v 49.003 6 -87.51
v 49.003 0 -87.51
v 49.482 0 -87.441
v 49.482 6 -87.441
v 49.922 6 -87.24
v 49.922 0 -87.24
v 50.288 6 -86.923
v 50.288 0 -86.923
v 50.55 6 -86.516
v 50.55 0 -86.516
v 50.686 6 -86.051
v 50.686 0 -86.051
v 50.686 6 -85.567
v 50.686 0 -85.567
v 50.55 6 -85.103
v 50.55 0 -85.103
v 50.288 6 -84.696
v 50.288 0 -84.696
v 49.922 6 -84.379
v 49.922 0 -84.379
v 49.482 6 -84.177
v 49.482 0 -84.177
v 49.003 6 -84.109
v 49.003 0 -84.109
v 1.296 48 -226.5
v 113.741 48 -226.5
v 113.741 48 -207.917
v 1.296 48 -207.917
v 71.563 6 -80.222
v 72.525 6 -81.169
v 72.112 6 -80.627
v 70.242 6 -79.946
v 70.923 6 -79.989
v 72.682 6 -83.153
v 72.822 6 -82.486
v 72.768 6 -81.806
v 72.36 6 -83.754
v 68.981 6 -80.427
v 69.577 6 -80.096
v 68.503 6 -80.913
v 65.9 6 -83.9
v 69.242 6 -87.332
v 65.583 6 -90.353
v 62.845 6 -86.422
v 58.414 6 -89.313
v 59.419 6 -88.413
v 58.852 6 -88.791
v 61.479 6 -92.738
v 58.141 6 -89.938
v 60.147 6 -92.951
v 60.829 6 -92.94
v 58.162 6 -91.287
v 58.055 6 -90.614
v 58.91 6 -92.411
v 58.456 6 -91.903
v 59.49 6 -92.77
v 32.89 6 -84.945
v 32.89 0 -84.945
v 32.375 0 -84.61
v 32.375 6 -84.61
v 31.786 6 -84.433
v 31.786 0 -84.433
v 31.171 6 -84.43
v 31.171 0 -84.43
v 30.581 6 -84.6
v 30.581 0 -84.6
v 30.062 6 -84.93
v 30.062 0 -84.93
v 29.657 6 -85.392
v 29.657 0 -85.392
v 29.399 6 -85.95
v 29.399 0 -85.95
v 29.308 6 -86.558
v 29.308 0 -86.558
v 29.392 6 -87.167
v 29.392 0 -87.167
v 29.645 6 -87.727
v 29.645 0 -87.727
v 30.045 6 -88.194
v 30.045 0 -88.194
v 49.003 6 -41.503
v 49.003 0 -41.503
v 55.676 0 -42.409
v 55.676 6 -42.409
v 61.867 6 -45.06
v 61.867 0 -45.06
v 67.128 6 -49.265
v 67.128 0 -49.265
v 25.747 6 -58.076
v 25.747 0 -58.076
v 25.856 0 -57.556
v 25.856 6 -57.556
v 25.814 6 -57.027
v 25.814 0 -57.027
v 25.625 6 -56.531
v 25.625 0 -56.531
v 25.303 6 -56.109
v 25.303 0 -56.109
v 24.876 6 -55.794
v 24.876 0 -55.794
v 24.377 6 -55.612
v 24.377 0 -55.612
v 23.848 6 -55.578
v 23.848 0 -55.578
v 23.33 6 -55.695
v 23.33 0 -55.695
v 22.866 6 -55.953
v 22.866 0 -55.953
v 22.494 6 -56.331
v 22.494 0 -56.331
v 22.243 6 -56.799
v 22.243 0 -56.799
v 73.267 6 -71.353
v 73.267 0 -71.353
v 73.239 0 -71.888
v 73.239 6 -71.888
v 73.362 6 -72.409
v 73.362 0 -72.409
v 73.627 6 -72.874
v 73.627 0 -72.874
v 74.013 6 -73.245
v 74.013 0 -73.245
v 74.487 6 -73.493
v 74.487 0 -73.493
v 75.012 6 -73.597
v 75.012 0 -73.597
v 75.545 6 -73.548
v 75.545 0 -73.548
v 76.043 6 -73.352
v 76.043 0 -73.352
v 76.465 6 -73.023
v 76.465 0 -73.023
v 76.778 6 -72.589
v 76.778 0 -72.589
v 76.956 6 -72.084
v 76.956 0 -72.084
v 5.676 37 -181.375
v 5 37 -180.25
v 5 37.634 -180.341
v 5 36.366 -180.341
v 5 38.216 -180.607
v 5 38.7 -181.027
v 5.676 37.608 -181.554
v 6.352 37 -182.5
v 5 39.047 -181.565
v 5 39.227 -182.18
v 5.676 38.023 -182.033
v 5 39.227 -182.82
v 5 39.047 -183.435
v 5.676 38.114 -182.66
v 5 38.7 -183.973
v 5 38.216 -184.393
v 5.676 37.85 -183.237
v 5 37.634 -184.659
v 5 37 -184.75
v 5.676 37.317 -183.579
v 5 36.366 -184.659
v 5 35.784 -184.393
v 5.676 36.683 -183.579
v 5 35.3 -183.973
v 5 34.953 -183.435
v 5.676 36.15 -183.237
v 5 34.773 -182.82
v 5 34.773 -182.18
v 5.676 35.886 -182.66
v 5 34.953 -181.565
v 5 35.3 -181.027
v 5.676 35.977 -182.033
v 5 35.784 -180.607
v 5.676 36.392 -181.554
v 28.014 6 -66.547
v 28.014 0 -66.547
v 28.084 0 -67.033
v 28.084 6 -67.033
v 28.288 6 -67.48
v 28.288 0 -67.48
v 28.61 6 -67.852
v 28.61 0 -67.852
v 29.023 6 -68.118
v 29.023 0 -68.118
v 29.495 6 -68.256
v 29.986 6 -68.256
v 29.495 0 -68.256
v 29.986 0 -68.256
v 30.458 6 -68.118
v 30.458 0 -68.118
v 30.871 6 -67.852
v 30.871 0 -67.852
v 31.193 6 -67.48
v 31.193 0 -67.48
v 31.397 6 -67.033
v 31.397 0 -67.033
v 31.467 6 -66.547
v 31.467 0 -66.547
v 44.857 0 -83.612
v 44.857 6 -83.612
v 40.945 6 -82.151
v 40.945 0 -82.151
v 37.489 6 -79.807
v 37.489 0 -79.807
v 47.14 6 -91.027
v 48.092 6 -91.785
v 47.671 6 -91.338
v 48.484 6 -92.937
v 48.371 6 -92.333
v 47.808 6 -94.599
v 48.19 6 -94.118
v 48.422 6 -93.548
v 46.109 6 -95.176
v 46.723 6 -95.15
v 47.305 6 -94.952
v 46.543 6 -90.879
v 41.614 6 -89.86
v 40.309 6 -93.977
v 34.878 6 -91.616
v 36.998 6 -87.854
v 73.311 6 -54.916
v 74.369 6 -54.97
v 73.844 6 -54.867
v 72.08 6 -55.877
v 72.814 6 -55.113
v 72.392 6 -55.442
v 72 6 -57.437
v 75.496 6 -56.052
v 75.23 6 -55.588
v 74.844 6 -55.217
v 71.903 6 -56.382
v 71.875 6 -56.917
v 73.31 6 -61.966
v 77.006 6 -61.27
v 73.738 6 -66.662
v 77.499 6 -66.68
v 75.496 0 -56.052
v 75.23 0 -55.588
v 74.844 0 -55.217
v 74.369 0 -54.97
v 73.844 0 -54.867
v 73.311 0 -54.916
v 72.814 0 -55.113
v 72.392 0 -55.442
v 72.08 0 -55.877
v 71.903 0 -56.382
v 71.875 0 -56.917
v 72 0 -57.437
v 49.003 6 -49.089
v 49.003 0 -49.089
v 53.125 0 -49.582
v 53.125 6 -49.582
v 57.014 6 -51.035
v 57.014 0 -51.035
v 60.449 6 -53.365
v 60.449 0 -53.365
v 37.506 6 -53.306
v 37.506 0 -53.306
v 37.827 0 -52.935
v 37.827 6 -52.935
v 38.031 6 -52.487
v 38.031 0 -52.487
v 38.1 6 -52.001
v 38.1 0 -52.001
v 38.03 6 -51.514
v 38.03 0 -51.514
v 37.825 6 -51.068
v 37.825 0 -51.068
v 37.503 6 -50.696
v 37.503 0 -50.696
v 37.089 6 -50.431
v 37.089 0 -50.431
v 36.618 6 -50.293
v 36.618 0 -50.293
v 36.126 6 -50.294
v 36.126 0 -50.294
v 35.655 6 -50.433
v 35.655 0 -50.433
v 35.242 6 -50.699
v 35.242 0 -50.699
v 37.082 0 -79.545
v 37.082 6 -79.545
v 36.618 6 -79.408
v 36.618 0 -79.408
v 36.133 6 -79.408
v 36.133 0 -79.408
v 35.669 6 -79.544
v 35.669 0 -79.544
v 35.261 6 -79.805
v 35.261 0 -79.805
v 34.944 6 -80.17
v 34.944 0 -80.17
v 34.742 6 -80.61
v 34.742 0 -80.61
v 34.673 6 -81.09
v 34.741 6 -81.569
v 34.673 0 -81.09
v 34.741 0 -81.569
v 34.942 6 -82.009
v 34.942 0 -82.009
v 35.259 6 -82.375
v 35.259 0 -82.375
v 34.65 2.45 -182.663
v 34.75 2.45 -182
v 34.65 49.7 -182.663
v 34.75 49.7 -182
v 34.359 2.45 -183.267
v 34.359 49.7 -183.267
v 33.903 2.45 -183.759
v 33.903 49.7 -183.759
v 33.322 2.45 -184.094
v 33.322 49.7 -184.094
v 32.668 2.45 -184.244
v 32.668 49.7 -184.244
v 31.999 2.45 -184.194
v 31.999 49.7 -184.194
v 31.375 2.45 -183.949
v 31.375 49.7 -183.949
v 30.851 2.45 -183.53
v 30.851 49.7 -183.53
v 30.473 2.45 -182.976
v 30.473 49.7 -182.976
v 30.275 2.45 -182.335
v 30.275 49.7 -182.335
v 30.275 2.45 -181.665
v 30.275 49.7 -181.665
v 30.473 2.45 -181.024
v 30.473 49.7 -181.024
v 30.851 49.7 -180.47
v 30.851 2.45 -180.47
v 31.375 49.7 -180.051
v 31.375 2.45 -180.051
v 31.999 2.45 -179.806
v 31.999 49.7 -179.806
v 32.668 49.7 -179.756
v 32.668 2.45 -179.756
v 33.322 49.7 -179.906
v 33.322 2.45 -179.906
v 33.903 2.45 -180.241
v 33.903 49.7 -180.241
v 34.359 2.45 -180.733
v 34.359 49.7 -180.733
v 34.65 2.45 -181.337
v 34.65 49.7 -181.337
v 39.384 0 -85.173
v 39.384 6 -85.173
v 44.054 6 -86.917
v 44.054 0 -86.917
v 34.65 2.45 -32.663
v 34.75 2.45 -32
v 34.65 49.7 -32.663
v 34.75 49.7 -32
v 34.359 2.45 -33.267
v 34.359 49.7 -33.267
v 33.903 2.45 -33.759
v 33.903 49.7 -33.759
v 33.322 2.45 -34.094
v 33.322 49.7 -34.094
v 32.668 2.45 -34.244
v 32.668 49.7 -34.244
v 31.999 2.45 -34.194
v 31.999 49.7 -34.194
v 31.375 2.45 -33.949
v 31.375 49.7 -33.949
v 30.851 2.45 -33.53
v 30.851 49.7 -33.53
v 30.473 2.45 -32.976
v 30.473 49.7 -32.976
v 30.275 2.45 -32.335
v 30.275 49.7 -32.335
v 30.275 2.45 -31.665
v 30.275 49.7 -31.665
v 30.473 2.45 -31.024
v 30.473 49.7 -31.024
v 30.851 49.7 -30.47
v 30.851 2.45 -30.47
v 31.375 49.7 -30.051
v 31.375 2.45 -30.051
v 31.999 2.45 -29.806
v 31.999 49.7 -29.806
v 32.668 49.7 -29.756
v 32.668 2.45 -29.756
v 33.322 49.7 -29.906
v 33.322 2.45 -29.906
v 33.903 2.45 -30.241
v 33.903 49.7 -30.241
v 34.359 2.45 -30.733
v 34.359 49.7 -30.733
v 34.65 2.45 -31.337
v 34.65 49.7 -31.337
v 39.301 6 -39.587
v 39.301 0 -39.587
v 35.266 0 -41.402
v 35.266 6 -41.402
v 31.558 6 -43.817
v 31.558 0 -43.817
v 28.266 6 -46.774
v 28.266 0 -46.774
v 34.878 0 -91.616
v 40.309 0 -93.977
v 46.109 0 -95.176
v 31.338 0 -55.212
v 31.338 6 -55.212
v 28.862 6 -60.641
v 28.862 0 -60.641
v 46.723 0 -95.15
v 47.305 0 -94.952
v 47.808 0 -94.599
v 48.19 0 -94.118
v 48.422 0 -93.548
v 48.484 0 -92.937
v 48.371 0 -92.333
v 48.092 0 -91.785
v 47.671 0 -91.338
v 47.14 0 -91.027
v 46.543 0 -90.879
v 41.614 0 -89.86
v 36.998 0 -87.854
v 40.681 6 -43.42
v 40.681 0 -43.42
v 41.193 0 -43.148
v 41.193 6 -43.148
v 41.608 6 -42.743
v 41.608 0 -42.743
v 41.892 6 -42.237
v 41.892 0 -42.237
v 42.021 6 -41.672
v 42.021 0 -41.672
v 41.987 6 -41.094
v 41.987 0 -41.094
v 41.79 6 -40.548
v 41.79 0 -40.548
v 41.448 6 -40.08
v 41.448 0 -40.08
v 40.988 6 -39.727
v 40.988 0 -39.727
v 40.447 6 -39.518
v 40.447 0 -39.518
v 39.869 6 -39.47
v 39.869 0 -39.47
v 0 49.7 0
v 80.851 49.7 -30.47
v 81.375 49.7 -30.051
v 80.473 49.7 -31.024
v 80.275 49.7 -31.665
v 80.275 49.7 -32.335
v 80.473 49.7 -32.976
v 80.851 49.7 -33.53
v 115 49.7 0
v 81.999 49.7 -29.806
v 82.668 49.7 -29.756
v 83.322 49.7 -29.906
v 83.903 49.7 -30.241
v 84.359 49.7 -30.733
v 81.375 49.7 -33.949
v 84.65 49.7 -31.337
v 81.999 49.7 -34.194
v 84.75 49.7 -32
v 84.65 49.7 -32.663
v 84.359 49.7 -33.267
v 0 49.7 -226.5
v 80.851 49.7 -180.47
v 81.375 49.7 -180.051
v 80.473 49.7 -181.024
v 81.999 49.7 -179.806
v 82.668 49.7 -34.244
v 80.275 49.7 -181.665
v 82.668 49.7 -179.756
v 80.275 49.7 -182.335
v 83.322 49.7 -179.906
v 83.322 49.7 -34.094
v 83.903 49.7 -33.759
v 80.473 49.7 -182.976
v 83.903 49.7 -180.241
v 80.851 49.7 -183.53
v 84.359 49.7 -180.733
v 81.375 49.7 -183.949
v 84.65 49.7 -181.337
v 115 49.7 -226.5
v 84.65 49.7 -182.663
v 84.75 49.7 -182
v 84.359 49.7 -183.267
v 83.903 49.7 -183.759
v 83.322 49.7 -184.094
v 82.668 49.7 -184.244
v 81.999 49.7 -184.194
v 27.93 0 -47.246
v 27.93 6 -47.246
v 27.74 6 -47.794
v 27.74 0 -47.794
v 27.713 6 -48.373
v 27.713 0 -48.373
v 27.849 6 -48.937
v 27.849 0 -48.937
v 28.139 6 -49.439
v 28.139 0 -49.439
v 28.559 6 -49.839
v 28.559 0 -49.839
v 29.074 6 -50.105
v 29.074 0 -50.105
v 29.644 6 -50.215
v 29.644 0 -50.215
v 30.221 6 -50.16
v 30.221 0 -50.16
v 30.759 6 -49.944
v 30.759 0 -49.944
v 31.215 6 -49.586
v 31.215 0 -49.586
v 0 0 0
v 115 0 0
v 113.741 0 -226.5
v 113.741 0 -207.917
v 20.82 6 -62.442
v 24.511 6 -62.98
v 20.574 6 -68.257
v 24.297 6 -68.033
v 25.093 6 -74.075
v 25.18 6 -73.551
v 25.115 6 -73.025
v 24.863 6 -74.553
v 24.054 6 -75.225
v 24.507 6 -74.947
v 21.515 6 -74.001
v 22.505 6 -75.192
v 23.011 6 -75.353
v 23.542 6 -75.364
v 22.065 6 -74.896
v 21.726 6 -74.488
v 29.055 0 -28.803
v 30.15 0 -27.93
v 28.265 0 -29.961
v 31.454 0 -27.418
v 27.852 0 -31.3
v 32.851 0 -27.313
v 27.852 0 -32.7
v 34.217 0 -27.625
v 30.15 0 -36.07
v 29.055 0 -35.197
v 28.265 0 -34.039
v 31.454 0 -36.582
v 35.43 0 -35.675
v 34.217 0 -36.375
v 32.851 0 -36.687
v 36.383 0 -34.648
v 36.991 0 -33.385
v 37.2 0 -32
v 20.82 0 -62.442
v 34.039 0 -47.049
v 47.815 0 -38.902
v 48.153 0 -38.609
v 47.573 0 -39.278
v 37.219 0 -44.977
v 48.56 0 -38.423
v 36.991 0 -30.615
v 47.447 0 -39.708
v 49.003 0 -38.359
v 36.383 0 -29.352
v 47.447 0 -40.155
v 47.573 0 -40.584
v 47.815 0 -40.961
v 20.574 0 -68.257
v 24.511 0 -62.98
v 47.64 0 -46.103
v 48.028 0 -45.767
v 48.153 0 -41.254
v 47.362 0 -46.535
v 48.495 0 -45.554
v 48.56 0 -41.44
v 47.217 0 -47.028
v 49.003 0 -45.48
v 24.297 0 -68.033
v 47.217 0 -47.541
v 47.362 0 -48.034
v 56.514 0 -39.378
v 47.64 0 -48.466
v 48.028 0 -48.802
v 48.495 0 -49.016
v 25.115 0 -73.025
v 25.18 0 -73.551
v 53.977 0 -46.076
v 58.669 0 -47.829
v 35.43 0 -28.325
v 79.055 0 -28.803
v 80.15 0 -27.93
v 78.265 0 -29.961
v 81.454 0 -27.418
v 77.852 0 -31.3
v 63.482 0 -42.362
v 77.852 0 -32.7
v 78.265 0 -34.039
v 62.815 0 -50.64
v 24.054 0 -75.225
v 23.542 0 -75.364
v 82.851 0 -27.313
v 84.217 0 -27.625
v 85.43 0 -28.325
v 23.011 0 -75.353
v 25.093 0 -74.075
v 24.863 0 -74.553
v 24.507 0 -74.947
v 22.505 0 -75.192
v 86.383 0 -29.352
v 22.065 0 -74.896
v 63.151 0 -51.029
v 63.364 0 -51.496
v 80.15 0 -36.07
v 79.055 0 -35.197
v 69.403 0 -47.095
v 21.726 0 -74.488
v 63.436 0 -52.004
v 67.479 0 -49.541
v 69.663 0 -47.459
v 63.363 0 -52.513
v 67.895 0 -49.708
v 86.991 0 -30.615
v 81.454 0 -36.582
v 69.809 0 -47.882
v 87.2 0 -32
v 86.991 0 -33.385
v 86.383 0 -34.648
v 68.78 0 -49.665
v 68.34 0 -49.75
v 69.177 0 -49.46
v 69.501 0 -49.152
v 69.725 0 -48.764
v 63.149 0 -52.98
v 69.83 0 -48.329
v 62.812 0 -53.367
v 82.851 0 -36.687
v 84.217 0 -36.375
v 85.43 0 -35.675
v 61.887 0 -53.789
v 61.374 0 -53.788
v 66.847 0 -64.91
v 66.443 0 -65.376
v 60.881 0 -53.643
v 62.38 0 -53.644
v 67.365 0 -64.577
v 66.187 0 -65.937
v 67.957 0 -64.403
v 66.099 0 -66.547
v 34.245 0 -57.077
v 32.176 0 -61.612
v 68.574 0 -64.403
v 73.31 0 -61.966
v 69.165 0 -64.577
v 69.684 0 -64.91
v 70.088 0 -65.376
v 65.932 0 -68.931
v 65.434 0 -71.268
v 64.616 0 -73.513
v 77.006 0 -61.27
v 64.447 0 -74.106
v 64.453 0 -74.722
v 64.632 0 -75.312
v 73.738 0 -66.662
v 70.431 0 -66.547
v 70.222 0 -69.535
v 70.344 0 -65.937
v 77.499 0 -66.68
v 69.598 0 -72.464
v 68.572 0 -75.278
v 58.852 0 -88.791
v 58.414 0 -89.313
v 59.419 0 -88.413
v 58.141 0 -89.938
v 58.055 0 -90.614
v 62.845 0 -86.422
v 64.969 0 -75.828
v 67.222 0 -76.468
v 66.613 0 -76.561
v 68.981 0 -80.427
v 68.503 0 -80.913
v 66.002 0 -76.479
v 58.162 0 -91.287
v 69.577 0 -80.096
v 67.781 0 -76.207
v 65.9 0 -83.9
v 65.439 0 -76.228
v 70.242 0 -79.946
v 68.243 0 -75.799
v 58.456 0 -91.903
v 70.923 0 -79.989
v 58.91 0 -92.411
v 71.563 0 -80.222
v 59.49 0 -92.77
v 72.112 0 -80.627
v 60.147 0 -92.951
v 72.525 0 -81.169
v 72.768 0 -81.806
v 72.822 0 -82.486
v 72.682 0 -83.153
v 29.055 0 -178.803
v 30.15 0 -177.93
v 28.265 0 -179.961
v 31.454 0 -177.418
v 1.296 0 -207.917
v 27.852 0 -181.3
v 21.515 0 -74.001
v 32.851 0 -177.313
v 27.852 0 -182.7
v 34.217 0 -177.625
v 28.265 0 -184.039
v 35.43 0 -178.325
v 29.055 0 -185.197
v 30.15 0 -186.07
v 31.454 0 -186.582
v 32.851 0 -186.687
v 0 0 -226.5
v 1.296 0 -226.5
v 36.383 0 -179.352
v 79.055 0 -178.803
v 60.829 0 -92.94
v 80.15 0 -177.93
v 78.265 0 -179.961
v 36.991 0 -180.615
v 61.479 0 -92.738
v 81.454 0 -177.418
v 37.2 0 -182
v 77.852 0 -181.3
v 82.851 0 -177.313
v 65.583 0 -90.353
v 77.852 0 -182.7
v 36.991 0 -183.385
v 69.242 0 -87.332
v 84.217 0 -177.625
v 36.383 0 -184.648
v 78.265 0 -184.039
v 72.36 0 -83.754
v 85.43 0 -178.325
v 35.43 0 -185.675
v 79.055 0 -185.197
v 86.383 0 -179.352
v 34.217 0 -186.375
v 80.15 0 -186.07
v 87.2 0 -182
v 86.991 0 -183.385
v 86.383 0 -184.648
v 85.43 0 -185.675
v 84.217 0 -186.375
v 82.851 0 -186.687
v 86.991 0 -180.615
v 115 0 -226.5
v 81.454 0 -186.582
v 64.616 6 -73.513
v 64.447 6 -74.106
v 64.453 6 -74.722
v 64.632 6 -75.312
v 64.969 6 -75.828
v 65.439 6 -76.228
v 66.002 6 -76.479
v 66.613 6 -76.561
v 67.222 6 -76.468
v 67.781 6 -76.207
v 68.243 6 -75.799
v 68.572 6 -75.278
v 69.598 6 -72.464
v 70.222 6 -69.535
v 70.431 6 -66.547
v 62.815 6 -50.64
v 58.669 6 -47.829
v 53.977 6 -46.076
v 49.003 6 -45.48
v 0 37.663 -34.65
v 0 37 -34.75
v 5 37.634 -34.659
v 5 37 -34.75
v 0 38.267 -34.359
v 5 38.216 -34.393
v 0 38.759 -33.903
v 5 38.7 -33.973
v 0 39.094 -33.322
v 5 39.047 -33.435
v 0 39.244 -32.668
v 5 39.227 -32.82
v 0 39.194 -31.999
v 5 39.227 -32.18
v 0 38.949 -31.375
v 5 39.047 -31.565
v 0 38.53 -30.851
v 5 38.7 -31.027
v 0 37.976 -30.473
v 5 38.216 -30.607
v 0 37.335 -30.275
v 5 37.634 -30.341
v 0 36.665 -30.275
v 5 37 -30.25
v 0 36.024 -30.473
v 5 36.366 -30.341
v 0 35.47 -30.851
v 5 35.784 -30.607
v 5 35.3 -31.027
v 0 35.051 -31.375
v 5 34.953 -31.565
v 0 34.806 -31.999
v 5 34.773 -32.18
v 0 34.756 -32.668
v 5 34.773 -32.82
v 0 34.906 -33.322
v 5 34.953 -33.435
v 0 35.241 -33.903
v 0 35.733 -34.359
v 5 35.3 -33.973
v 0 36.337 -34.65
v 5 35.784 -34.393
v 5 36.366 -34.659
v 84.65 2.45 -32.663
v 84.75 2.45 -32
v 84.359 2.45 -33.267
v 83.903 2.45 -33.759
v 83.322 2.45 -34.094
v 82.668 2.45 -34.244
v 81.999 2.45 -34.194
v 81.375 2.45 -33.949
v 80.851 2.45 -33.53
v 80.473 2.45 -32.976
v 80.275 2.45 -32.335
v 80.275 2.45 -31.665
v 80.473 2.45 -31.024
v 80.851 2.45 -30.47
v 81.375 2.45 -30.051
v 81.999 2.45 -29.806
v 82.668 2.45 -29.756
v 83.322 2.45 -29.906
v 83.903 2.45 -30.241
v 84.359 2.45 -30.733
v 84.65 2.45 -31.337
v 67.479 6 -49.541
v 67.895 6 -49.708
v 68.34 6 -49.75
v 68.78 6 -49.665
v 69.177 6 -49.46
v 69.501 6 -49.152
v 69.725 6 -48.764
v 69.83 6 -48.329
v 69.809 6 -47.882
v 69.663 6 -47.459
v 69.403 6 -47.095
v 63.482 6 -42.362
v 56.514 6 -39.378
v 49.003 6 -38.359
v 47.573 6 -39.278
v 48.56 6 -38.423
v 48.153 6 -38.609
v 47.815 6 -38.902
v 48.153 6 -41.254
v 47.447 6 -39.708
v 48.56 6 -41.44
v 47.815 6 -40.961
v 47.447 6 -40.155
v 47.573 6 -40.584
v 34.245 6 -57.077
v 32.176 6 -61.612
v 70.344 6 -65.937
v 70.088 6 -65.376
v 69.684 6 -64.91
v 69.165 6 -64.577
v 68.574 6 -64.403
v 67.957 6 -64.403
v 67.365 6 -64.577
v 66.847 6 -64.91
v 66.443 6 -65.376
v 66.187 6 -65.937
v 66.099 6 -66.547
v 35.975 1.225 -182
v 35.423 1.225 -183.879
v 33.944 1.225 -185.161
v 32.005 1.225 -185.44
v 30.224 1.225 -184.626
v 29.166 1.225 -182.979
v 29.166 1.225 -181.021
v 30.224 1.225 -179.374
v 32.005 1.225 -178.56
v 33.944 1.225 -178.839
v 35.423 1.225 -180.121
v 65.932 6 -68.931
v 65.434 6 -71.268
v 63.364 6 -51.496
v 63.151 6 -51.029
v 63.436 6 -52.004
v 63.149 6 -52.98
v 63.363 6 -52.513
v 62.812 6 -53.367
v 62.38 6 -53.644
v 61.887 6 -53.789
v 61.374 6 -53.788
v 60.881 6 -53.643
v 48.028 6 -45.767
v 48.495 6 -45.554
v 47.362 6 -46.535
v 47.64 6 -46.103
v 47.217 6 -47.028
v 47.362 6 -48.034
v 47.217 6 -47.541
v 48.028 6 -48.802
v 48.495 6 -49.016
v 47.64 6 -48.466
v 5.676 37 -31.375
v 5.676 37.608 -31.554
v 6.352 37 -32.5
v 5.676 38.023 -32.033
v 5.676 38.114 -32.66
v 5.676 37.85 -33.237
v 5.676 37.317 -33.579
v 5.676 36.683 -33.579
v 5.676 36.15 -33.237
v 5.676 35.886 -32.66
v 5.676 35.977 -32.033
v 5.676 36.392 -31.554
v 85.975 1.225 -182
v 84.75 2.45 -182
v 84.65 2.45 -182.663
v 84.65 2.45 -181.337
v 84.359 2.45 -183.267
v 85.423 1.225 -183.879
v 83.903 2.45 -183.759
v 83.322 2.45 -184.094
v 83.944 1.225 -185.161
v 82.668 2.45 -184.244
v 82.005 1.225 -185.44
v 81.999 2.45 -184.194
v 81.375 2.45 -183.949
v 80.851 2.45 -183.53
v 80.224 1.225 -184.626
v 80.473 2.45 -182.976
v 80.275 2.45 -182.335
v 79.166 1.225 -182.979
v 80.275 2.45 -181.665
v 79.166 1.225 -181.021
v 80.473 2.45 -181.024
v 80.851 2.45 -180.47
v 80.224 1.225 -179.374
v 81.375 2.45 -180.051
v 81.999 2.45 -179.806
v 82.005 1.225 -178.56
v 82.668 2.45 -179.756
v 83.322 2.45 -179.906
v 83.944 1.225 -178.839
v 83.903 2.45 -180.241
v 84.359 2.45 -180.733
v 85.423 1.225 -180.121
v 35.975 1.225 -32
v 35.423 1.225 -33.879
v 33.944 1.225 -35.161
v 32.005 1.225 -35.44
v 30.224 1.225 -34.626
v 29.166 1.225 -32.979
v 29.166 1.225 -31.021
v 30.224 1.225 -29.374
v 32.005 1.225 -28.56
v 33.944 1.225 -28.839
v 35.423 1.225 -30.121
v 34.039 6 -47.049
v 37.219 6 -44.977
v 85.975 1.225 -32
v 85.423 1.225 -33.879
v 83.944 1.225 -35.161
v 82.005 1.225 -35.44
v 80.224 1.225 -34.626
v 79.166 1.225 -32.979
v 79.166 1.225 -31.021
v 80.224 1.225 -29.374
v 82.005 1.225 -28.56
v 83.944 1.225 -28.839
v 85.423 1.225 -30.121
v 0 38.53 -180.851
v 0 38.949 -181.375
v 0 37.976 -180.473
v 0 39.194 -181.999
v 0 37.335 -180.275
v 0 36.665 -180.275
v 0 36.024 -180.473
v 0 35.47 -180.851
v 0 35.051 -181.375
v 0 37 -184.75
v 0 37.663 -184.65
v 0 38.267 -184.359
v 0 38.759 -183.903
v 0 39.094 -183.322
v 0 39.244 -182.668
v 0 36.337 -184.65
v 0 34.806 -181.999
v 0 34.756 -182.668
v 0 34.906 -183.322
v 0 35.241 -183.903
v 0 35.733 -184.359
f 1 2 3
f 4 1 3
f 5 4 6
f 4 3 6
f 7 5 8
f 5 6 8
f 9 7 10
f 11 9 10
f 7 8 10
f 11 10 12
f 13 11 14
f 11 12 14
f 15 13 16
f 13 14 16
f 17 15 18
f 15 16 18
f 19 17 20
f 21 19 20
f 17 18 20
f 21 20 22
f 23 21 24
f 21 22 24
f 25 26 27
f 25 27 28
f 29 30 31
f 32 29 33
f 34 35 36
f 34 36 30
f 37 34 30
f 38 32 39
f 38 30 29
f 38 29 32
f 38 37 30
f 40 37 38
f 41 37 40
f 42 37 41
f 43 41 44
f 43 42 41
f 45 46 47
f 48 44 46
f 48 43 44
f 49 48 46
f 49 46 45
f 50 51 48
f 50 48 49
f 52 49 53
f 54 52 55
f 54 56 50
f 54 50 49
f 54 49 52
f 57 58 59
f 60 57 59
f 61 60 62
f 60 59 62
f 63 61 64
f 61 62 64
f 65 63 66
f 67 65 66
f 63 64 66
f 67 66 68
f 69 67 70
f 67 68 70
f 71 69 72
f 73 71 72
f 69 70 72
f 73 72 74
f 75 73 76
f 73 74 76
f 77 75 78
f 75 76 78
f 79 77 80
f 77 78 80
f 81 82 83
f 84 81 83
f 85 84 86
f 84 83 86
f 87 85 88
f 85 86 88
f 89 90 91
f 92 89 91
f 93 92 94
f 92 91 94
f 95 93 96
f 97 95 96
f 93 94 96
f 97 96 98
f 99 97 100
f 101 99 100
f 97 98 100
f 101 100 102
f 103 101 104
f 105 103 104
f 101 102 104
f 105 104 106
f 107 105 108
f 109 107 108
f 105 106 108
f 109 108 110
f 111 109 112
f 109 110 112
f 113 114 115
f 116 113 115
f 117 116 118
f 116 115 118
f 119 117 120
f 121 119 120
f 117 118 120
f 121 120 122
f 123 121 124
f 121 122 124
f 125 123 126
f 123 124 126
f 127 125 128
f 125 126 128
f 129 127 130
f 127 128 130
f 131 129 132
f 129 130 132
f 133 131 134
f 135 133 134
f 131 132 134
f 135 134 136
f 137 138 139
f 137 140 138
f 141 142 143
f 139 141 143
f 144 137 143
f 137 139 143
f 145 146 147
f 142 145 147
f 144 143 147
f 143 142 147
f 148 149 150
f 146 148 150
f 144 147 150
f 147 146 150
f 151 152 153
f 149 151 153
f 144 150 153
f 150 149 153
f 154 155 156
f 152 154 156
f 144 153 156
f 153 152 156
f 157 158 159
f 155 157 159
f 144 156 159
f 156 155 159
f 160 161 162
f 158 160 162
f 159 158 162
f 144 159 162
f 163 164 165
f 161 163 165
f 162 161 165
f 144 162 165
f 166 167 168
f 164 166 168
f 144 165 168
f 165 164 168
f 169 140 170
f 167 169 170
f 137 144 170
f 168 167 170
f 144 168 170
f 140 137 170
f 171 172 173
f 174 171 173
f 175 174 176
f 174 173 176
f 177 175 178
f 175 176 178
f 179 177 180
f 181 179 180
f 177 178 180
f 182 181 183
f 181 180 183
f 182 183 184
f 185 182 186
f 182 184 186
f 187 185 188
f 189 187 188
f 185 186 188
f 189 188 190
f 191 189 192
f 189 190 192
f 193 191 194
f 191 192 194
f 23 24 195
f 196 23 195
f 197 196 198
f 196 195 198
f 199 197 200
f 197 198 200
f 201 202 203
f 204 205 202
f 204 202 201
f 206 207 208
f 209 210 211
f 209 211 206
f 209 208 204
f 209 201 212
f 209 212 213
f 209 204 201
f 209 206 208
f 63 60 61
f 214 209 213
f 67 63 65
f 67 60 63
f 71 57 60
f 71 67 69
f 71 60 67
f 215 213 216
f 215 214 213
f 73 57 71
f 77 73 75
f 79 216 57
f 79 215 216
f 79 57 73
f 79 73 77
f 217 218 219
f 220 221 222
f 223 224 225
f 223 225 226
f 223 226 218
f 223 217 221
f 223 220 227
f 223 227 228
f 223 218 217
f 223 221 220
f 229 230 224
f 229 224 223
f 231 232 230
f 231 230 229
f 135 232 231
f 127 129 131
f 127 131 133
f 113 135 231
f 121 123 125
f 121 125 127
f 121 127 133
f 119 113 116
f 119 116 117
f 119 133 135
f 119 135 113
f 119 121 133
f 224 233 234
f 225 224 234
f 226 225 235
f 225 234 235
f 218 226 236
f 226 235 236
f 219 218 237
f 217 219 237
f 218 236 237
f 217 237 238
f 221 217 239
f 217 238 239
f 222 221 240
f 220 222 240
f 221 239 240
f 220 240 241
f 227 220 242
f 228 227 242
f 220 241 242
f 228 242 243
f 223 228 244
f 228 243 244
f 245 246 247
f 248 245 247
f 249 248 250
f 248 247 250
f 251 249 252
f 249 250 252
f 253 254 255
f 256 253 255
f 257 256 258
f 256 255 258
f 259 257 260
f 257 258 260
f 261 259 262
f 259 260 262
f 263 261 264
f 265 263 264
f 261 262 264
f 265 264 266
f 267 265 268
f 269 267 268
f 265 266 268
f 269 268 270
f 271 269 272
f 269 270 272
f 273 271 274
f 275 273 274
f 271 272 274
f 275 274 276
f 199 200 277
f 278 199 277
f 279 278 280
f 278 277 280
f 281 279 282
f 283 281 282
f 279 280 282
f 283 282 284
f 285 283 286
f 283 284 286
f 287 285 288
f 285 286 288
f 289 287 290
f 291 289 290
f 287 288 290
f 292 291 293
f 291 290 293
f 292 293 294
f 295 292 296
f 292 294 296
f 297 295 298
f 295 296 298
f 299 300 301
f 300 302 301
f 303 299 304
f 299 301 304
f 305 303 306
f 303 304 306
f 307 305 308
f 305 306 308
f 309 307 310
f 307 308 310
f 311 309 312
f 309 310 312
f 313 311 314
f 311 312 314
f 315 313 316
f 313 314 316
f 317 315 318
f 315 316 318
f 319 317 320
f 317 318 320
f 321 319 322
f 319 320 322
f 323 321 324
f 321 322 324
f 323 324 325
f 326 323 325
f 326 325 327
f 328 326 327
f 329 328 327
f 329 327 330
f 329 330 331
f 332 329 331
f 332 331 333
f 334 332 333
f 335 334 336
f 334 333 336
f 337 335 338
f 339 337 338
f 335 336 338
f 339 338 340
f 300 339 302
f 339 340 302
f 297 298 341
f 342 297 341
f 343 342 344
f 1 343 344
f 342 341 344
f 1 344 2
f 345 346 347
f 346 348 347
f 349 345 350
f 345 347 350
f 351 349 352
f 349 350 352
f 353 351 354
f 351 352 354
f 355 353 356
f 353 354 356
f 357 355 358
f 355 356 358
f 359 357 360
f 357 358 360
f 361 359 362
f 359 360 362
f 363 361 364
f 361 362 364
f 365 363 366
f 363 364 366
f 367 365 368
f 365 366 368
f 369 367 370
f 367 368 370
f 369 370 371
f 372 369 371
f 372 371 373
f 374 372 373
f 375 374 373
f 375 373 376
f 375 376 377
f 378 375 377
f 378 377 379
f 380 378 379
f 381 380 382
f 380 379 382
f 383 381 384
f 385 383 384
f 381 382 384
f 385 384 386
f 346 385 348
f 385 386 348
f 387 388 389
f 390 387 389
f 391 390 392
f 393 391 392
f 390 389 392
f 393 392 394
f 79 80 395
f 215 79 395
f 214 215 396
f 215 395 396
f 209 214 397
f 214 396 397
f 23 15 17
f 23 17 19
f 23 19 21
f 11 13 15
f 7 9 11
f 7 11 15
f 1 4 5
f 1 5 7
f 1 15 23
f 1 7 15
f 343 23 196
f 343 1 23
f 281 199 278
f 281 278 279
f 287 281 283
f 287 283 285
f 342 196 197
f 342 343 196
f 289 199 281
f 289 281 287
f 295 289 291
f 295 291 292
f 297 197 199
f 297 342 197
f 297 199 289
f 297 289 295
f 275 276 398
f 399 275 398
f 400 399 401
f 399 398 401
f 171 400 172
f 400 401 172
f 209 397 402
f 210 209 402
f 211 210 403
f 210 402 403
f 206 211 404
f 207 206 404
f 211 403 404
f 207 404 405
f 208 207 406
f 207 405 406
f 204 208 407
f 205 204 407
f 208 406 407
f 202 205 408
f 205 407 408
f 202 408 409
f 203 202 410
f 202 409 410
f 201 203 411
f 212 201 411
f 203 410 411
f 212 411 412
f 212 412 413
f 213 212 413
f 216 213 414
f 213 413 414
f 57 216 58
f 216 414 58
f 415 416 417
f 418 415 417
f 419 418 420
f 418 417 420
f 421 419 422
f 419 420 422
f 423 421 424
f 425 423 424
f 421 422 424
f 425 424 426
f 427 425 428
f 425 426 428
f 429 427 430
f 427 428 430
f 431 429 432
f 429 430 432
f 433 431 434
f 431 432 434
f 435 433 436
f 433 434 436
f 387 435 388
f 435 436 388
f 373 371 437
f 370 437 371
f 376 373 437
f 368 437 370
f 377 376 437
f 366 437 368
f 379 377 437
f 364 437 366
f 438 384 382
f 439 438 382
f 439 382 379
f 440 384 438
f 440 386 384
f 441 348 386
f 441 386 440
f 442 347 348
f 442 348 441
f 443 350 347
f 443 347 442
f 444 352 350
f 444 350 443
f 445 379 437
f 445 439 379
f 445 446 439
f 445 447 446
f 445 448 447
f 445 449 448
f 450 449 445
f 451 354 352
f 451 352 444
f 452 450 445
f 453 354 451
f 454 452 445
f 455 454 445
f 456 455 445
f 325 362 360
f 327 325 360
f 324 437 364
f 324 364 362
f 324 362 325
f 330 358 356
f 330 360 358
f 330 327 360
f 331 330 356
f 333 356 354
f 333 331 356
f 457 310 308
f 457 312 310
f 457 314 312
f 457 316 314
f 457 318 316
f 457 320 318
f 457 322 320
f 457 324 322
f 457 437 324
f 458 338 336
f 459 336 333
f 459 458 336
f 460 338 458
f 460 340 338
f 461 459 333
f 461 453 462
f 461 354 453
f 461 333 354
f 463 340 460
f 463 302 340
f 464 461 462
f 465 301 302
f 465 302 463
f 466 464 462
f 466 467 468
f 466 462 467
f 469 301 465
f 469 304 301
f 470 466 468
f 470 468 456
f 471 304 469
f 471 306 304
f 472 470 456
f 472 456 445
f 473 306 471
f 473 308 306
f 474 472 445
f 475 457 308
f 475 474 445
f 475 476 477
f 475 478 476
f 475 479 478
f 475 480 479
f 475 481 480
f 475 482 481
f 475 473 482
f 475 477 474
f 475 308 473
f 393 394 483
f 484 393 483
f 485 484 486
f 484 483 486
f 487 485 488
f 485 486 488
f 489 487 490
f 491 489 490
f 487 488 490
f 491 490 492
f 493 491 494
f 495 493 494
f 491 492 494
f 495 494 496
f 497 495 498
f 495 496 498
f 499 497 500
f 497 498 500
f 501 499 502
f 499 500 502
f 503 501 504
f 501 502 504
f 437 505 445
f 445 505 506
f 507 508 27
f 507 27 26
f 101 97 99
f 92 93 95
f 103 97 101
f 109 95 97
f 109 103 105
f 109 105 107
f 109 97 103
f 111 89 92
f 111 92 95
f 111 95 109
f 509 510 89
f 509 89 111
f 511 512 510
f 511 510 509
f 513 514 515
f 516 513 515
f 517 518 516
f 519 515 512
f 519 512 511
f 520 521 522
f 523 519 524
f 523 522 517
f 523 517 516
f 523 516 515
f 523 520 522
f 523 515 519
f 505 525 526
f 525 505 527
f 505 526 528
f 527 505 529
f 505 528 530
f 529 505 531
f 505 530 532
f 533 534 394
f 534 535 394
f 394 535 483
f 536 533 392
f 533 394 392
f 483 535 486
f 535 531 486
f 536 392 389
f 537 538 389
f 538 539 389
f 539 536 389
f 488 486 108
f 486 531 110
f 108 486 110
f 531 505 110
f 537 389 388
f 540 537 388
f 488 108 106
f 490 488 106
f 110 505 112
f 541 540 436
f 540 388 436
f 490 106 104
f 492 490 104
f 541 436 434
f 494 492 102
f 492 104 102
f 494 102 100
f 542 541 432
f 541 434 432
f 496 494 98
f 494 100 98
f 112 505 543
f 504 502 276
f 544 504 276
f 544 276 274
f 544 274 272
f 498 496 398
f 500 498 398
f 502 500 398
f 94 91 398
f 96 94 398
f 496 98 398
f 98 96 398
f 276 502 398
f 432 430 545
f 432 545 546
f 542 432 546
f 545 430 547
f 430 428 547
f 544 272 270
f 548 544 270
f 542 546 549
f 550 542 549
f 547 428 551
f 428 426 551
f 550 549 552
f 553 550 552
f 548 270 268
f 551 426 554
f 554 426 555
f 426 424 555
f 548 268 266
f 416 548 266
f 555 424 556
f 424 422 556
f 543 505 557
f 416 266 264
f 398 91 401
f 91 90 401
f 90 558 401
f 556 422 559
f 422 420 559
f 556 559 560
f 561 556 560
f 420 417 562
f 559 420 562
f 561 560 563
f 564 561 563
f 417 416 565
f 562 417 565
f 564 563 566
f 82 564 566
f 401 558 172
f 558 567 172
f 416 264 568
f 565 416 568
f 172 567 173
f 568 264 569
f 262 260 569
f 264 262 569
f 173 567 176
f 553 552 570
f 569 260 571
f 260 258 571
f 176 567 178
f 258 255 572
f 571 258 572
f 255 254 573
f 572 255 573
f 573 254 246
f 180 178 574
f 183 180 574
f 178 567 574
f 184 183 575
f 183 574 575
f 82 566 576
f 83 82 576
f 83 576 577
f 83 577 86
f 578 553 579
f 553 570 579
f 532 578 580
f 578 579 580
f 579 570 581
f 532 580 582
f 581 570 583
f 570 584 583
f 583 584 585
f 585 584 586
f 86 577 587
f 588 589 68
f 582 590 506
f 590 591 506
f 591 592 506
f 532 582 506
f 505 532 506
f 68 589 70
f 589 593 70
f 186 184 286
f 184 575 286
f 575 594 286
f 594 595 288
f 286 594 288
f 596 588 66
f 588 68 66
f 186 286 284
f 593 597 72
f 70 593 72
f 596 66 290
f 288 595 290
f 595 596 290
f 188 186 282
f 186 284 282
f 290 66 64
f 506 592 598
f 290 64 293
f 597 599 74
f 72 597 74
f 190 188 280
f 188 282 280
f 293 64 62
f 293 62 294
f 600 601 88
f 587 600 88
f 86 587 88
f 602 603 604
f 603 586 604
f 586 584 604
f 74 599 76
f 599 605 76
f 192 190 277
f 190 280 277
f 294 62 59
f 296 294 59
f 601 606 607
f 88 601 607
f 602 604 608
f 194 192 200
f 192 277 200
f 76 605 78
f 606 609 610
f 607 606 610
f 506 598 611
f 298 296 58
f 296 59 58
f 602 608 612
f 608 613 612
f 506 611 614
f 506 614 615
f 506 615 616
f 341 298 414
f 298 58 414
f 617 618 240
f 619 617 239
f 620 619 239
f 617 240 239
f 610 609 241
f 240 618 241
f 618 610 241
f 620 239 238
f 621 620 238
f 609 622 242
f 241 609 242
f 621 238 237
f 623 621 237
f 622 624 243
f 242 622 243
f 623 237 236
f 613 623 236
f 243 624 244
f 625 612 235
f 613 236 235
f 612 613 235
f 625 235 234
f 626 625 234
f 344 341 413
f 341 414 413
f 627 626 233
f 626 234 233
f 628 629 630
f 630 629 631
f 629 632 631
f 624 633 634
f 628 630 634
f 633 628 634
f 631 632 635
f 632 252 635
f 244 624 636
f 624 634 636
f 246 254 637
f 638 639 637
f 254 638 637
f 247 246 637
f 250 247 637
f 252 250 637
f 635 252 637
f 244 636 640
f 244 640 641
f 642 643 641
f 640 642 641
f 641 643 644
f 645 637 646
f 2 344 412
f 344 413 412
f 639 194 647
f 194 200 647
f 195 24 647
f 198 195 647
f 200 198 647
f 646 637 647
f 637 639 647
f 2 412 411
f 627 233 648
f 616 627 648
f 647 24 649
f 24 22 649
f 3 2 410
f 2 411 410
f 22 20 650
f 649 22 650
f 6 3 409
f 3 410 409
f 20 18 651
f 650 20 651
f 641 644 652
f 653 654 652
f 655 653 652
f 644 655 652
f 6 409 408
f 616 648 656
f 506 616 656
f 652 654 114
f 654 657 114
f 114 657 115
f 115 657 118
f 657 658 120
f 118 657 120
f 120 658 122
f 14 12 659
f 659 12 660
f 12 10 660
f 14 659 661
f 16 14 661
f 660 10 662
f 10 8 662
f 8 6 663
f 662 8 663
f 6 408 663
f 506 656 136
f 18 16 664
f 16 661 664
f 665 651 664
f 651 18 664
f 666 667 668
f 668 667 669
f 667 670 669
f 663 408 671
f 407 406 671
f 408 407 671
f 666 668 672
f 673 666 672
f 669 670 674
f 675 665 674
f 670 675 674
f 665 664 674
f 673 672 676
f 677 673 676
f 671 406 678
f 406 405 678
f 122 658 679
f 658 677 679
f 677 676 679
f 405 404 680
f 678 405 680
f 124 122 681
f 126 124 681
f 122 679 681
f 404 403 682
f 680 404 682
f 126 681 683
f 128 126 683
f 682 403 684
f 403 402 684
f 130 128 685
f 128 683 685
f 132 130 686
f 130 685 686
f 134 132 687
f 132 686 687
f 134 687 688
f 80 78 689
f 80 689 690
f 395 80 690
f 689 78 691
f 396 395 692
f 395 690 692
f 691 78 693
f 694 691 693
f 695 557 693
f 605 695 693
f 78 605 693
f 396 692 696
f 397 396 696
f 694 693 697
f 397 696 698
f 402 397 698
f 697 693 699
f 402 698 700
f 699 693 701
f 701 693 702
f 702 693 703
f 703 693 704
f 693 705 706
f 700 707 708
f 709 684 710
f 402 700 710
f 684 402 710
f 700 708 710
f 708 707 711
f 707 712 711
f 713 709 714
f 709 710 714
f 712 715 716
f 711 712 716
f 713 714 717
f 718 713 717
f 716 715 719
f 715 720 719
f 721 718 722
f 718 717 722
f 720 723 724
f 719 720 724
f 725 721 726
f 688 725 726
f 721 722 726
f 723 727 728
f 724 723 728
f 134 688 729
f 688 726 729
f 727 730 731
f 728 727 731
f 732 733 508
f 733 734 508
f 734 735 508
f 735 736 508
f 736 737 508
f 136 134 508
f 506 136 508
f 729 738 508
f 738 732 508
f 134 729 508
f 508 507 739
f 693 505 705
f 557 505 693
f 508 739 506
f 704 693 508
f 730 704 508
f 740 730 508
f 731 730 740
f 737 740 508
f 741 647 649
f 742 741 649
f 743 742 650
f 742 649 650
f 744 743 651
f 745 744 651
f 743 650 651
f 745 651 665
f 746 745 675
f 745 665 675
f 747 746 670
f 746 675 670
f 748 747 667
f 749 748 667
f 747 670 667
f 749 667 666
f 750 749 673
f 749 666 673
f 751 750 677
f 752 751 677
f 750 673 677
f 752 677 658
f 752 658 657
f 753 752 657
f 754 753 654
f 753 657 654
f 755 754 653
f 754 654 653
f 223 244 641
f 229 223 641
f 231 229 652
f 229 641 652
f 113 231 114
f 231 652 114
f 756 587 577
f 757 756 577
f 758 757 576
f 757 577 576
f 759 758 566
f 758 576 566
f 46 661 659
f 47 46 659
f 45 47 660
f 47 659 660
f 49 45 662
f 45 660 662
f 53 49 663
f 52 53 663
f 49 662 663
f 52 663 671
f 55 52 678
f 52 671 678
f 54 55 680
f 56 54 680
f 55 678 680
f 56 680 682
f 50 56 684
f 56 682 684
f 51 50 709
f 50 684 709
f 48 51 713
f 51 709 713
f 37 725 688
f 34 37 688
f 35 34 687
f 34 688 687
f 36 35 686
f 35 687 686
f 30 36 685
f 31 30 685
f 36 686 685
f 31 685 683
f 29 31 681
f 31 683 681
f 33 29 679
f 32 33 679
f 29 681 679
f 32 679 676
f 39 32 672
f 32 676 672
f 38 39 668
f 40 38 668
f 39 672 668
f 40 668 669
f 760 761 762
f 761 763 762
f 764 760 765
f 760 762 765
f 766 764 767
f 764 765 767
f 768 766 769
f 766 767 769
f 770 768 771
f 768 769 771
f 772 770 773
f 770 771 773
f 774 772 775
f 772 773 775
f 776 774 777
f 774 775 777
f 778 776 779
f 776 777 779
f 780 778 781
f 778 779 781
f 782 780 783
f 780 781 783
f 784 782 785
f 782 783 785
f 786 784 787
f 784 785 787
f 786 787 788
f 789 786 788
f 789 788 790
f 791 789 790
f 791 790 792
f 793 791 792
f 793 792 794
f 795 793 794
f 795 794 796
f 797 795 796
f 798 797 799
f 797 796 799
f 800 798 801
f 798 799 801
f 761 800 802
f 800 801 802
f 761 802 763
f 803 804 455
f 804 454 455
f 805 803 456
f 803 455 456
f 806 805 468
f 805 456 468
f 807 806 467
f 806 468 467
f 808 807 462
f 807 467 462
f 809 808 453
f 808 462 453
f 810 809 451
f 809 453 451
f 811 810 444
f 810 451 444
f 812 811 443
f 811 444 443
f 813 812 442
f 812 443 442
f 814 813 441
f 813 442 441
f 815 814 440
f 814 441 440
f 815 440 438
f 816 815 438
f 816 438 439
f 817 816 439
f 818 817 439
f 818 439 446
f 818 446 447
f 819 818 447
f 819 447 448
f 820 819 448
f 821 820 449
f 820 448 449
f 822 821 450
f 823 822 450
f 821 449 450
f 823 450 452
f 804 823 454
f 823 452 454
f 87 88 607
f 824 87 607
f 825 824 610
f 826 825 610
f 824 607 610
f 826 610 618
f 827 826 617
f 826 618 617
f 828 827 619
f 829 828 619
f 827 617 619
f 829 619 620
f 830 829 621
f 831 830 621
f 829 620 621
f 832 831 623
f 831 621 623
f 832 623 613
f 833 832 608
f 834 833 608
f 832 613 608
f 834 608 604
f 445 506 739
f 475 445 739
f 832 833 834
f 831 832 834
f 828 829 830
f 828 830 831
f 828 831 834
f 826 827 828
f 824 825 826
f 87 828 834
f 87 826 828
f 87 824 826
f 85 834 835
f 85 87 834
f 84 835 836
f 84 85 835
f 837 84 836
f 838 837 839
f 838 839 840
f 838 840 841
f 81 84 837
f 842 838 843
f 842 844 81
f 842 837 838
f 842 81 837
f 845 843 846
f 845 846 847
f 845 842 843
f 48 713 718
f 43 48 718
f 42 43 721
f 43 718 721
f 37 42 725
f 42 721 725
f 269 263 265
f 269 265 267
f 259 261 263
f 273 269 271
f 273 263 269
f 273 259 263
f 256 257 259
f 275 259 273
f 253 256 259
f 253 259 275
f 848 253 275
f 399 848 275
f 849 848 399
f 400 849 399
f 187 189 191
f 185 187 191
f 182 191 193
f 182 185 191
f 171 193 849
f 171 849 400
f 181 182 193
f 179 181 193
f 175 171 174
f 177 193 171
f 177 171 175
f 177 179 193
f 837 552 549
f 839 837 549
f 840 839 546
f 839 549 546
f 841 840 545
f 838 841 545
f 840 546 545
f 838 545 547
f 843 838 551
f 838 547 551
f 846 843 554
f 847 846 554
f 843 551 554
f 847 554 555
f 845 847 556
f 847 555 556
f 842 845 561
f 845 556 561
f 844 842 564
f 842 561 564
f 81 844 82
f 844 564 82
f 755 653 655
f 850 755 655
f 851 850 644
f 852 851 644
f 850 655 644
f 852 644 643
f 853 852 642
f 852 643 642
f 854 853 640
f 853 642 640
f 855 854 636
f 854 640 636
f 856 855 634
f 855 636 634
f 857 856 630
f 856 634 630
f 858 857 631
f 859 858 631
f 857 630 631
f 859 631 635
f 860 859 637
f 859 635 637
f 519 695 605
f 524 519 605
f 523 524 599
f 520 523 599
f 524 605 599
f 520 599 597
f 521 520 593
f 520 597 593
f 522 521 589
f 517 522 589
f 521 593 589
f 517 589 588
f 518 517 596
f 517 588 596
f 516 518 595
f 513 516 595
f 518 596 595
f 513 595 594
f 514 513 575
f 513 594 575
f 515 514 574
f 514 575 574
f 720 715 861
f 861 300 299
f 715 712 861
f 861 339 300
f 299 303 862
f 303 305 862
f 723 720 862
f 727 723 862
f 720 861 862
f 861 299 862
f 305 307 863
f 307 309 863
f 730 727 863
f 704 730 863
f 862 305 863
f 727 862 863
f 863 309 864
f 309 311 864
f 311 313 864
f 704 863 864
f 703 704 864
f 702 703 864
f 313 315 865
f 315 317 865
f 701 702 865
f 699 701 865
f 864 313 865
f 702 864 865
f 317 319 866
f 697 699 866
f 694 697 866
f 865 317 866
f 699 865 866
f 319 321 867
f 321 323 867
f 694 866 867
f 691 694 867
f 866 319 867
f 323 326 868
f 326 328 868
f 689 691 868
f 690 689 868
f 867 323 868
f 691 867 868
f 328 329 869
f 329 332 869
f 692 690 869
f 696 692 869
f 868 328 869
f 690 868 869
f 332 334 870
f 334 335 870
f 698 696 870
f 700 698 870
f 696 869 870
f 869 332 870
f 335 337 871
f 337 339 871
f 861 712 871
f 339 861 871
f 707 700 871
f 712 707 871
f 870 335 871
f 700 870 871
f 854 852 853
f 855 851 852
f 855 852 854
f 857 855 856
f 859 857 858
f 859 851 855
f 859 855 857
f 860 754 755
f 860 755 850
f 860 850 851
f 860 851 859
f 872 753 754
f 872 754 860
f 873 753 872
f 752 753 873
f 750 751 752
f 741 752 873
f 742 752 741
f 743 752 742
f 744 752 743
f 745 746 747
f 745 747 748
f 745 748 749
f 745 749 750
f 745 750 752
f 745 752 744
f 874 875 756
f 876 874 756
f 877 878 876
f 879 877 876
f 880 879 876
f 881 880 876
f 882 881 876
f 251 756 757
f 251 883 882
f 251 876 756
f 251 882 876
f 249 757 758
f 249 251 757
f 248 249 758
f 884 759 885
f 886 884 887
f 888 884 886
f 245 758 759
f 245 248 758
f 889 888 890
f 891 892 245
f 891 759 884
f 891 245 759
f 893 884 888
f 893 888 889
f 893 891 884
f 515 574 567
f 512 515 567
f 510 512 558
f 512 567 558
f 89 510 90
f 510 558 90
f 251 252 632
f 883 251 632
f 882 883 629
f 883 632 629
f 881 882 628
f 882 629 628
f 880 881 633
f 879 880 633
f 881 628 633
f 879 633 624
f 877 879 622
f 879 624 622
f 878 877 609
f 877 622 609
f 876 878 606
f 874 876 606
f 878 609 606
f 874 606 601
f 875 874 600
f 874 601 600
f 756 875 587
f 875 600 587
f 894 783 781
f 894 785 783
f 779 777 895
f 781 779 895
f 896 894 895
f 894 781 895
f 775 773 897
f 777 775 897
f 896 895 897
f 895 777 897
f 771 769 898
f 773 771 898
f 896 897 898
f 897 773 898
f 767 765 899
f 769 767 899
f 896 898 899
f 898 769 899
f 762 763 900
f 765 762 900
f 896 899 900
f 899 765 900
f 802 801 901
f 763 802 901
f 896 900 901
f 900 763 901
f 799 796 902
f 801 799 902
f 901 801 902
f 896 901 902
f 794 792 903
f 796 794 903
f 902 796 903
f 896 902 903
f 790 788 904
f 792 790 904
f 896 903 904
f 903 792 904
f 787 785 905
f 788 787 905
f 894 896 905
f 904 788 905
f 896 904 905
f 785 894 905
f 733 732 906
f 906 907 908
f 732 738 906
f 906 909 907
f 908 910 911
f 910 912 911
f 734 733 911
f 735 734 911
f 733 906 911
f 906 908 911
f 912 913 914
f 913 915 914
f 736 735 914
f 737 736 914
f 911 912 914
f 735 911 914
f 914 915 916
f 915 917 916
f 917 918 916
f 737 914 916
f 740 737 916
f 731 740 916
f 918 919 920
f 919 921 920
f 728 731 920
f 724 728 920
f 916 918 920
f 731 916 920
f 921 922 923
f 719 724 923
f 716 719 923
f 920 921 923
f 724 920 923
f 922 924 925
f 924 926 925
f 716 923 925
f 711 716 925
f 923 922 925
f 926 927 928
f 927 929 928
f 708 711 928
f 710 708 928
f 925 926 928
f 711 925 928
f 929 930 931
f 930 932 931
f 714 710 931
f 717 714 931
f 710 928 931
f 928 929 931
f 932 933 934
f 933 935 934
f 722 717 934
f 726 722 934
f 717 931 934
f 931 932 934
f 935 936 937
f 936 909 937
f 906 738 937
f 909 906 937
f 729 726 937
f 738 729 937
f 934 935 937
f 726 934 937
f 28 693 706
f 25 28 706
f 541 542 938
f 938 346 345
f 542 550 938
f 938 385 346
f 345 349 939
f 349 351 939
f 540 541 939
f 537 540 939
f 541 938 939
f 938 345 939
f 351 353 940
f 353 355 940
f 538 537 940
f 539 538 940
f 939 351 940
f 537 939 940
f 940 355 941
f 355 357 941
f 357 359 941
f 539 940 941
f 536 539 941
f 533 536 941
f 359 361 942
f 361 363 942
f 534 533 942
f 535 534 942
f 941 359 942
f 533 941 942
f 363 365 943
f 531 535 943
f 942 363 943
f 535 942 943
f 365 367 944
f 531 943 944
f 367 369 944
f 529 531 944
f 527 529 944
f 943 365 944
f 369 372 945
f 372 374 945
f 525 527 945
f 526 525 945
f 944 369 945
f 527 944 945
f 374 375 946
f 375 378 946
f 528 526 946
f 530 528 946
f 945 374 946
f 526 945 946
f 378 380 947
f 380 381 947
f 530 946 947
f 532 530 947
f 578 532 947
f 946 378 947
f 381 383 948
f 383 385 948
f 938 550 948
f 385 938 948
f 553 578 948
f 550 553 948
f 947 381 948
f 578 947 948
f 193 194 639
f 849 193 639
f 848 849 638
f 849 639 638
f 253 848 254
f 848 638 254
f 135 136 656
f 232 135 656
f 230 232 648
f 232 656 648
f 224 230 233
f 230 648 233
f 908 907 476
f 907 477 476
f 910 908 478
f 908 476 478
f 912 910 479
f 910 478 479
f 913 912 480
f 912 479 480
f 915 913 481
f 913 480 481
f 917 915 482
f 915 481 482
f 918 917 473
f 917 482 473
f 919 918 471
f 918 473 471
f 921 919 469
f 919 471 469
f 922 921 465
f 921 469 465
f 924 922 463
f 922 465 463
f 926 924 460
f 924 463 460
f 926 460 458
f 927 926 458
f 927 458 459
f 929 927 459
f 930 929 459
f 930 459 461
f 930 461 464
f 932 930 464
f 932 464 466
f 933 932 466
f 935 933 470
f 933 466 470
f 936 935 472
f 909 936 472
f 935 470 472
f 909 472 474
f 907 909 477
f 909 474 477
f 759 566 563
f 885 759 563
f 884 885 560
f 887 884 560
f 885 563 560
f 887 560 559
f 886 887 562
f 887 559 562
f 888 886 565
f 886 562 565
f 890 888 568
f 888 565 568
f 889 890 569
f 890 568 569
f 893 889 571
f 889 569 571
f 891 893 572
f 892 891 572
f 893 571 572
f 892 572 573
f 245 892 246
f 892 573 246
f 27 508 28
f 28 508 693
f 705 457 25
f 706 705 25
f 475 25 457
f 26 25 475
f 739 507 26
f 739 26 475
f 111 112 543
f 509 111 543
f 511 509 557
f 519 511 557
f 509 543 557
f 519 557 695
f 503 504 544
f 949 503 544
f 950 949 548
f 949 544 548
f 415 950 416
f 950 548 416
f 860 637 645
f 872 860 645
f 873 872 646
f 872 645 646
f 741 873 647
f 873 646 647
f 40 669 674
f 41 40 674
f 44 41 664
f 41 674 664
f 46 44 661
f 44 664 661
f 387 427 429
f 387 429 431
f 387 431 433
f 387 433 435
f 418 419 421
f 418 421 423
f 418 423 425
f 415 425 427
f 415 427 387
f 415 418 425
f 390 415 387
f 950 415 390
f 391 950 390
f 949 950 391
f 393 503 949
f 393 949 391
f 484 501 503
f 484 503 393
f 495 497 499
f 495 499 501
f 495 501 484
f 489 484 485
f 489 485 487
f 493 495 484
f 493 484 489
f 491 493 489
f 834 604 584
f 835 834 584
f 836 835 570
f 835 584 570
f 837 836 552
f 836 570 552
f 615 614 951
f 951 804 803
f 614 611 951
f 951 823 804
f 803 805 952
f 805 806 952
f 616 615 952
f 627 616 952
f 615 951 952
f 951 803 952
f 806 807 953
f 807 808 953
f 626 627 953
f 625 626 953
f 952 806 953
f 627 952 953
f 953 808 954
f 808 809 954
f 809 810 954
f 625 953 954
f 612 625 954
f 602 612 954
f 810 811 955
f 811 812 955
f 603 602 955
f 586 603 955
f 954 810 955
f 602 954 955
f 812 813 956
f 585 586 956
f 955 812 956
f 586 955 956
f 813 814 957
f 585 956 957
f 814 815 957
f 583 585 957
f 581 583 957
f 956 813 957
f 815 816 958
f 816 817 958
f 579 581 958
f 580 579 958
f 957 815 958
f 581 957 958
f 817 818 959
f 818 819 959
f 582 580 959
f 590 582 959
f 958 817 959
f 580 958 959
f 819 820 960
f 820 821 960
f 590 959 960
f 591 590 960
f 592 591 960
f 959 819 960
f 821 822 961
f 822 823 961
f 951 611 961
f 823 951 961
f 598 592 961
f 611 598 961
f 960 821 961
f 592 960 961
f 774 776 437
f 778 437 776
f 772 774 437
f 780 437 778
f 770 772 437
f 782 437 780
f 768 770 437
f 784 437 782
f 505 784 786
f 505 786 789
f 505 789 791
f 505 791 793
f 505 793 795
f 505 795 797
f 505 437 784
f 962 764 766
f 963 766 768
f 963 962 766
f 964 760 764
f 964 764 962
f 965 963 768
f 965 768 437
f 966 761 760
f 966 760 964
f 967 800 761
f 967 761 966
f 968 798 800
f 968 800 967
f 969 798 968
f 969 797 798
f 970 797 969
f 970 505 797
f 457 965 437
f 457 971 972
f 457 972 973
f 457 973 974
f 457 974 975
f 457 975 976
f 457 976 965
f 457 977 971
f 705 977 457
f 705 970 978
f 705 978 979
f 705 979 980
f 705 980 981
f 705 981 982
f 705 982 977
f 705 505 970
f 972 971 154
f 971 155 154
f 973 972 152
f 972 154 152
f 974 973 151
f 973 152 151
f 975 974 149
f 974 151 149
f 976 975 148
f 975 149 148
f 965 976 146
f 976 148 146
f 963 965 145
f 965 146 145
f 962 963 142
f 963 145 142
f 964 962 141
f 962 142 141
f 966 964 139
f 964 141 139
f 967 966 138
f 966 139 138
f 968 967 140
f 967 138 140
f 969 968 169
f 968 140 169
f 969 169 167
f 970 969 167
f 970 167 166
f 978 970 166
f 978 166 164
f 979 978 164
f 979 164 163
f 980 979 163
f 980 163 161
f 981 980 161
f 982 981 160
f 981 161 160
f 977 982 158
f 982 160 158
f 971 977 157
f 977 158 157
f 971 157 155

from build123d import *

# Parameters (mm, degrees)
SKETCH3_W                                       = 115
SKETCH3_H                                       = 226.5
BOSS_EXTRUDE1_DEPTH                             = 49.7
CSK_FOR_M4_FLAT_HEAD_MACHINE_SCREW2_D           = 4.5
CSK_FOR_M4_FLAT_HEAD_MACHINE_SCREW2_CSINK_D     = 9.4
CSK_FOR_M4_FLAT_HEAD_MACHINE_SCREW2_CSINK_ANGLE = 90
SKETCH8_W                                       = 112.444388117
SKETCH8_H                                       = 18.583241451
CUT_EXTRUDE1_DEPTH                              = 48
CUT_EXTRUDE2_DEPTH                              = 6
M4_CLEARANCE_HOLE1_D                            = 4.5
M4_CLEARANCE_HOLE1_DEPTH                        = 5
M4_CLEARANCE_HOLE1_TIP                          = 1.351936393


with BuildPart() as part:
    # Sketch3 → Boss-Extrude1 (new body)
    with BuildSketch(Plane(origin=(0, 0, 0), x_dir=(1, 0, 0), z_dir=(0, 1, 0))):
        with Locations((57.5, 113.25)):
            Rectangle(SKETCH3_W, SKETCH3_H)
    extrude(amount=BOSS_EXTRUDE1_DEPTH)

    # CSK for M4 Flat Head Machine Screw2 (through all)
    with Locations(Plane(origin=(0, 0, 0), x_dir=(-1, 0, 0), z_dir=(0, -1, 0))):
        with Locations((-32.5, 32), (-82.5, 32), (-82.5, 182), (-32.5, 182)):
            CounterSinkHole(CSK_FOR_M4_FLAT_HEAD_MACHINE_SCREW2_D / 2, CSK_FOR_M4_FLAT_HEAD_MACHINE_SCREW2_CSINK_D / 2, counter_sink_angle=CSK_FOR_M4_FLAT_HEAD_MACHINE_SCREW2_CSINK_ANGLE)

    # Sketch8 → Cut-Extrude1 (cut)
    with BuildSketch(Plane(origin=(0, 0, 0), x_dir=(-1, 0, 0), z_dir=(0, -1, 0))):
        with Locations((-57.518541752, 217.208379275)):
            Rectangle(SKETCH8_W, SKETCH8_H)
    extrude(amount=-CUT_EXTRUDE1_DEPTH, mode=Mode.SUBTRACT)

    # Sketch9 → Cut-Extrude2 (cut)
    with BuildSketch(Plane(origin=(0, 0, 0), x_dir=(-1, 0, 0), z_dir=(0, -1, 0))):
        with BuildLine():
            ThreePointArc((-35.24160151, 50.698787363), (-29.906155704, 57.837710564), (-28.013949561, 66.546944878))
            ThreePointArc((-28.013949561, 66.546944878), (-29.740661802, 68.27365712), (-31.467374044, 66.546944878))
            ThreePointArc((-31.467374044, 66.546944878), (-33.0482468, 59.270680978), (-37.505827146, 53.306357674))
            ThreePointArc((-37.505827146, 53.306357674), (-37.677499484, 50.870459701), (-35.24160151, 50.698787363))
        make_face()
        with BuildLine():
            ThreePointArc((-62.815145497, 50.64033664), (-56.375233323, 46.812564416), (-49.002996311, 45.480486923))
            ThreePointArc((-49.002996311, 45.480486923), (-47.198872865, 47.284610369), (-49.002996311, 49.088733815))
            ThreePointArc((-49.002996311, 49.088733815), (-55.112522176, 50.192654089), (-60.449411092, 53.364808398))
            ThreePointArc((-60.449411092, 53.364808398), (-62.994514173, 53.185439721), (-62.815145497, 50.64033664))
        make_face()
        with BuildLine():
            ThreePointArc((-68.572182043, 75.27774008), (-69.961499926, 71.01023305), (-70.43147771, 66.546944878))
            ThreePointArc((-70.43147771, 66.546944878), (-68.26533082, 64.380797988), (-66.09918393, 66.546944878))
            ThreePointArc((-66.09918393, 66.546944878), (-65.724223696, 70.107869732), (-64.615790544, 73.512595409))
            ThreePointArc((-64.615790544, 73.512595409), (-65.711413958, 76.373363494), (-68.572182043, 75.27774008))
        make_face()
        with BuildLine():
            ThreePointArc((-35.258623929, 82.375498714), (-41.66693518, 86.184487896), (-49.002996311, 87.510028828))
            ThreePointArc((-49.002996311, 87.510028828), (-50.703745752, 85.809279387), (-49.002996311, 84.108529946))
            ThreePointArc((-49.002996311, 84.108529946), (-42.857294566, 82.998073111), (-37.488804727, 79.807135761))
            ThreePointArc((-37.488804727, 79.807135761), (-35.089532852, 79.976226838), (-35.258623929, 82.375498714))
        make_face()
        with BuildLine():
            ThreePointArc((-69.40308911, 47.094937136), (-60.098890521, 40.635064917), (-49.002996311, 38.359281062))
            ThreePointArc((-49.002996311, 38.359281062), (-47.430907963, 39.93136941), (-49.002996311, 41.503457758))
            ThreePointArc((-49.002996311, 41.503457758), (-58.861205404, 43.525390616), (-67.12757253, 49.264700116))
            ThreePointArc((-67.12757253, 49.264700116), (-69.35021231, 49.317576916), (-69.40308911, 47.094937136))
        make_face()
        with BuildLine():
            ThreePointArc((-76.955702254, 72.084205228), (-77.381483247, 63.963052285), (-75.495983574, 56.052344001))
            ThreePointArc((-75.495983574, 56.052344001), (-73.055355825, 54.99668972), (-71.999701544, 57.437317469))
            ThreePointArc((-71.999701544, 57.437317469), (-73.636371647, 64.304048834), (-73.266781011, 71.353452457))
            ThreePointArc((-73.266781011, 71.353452457), (-74.745865247, 73.563289464), (-76.955702254, 72.084205228))
        make_face()
        with BuildLine():
            ThreePointArc((-61.479475854, 92.737765271), (-67.474162168, 88.917408587), (-72.359830302, 83.7539179))
            ThreePointArc((-72.359830302, 83.7539179), (-71.852094521, 80.404948498), (-68.503125119, 80.912684278))
            ThreePointArc((-68.503125119, 80.912684278), (-64.424183685, 85.223573911), (-59.419346329, 88.41310925))
            ThreePointArc((-59.419346329, 88.41310925), (-58.287083081, 91.605502023), (-61.479475854, 92.737765271))
        make_face()
        with BuildLine():
            ThreePointArc((-30.044644277, 88.193682414), (-37.532685074, 92.936949007), (-46.109148954, 95.176056029))
            ThreePointArc((-46.109148954, 95.176056029), (-48.474789772, 93.244752833), (-46.543486577, 90.879112015))
            ThreePointArc((-46.543486577, 90.879112015), (-39.254264376, 88.976072623), (-32.890103811, 84.944723032))
            ThreePointArc((-32.890103811, 84.944723032), (-29.842894353, 85.146472956), (-30.044644277, 88.193682414))
        make_face()
        with BuildLine():
            ThreePointArc((-22.242703071, 56.799039322), (-20.547999949, 65.343558372), (-21.515231892, 74.000652968))
            ThreePointArc((-21.515231892, 74.000652968), (-23.803146789, 75.312452747), (-25.114946569, 73.02453785))
            ThreePointArc((-25.114946569, 73.02453785), (-24.274380402, 65.501150237), (-25.747150317, 58.075595617))
            ThreePointArc((-25.747150317, 58.075595617), (-24.633204841, 55.685093846), (-22.242703071, 56.799039322))
        make_face()
        with BuildLine():
            ThreePointArc((-39.301431481, 39.586636452), (-33.365347236, 42.53772744), (-28.266328256, 46.774004062))
            ThreePointArc((-28.266328256, 46.774004062), (-28.334847238, 49.654152172), (-31.214995349, 49.58563319))
            ThreePointArc((-31.214995349, 49.58563319), (-35.588955249, 45.951737309), (-40.680953248, 43.420279064))
            ThreePointArc((-40.680953248, 43.420279064), (-41.90801367, 40.813696874), (-39.301431481, 39.586636452))
        make_face()
    extrude(amount=-CUT_EXTRUDE2_DEPTH, mode=Mode.SUBTRACT)

    # M4 Clearance Hole1
    with Locations(Plane.ZY):
        with Locations((-32.5, 37), (-182.5, 37)):
            Hole(M4_CLEARANCE_HOLE1_D / 2, depth=M4_CLEARANCE_HOLE1_DEPTH)
            with Locations((0, 0, -(M4_CLEARANCE_HOLE1_DEPTH + M4_CLEARANCE_HOLE1_TIP / 2))):  # 118° drill point
                Cone(0, M4_CLEARANCE_HOLE1_D / 2, M4_CLEARANCE_HOLE1_TIP, mode=Mode.SUBTRACT)


solid = part.part
